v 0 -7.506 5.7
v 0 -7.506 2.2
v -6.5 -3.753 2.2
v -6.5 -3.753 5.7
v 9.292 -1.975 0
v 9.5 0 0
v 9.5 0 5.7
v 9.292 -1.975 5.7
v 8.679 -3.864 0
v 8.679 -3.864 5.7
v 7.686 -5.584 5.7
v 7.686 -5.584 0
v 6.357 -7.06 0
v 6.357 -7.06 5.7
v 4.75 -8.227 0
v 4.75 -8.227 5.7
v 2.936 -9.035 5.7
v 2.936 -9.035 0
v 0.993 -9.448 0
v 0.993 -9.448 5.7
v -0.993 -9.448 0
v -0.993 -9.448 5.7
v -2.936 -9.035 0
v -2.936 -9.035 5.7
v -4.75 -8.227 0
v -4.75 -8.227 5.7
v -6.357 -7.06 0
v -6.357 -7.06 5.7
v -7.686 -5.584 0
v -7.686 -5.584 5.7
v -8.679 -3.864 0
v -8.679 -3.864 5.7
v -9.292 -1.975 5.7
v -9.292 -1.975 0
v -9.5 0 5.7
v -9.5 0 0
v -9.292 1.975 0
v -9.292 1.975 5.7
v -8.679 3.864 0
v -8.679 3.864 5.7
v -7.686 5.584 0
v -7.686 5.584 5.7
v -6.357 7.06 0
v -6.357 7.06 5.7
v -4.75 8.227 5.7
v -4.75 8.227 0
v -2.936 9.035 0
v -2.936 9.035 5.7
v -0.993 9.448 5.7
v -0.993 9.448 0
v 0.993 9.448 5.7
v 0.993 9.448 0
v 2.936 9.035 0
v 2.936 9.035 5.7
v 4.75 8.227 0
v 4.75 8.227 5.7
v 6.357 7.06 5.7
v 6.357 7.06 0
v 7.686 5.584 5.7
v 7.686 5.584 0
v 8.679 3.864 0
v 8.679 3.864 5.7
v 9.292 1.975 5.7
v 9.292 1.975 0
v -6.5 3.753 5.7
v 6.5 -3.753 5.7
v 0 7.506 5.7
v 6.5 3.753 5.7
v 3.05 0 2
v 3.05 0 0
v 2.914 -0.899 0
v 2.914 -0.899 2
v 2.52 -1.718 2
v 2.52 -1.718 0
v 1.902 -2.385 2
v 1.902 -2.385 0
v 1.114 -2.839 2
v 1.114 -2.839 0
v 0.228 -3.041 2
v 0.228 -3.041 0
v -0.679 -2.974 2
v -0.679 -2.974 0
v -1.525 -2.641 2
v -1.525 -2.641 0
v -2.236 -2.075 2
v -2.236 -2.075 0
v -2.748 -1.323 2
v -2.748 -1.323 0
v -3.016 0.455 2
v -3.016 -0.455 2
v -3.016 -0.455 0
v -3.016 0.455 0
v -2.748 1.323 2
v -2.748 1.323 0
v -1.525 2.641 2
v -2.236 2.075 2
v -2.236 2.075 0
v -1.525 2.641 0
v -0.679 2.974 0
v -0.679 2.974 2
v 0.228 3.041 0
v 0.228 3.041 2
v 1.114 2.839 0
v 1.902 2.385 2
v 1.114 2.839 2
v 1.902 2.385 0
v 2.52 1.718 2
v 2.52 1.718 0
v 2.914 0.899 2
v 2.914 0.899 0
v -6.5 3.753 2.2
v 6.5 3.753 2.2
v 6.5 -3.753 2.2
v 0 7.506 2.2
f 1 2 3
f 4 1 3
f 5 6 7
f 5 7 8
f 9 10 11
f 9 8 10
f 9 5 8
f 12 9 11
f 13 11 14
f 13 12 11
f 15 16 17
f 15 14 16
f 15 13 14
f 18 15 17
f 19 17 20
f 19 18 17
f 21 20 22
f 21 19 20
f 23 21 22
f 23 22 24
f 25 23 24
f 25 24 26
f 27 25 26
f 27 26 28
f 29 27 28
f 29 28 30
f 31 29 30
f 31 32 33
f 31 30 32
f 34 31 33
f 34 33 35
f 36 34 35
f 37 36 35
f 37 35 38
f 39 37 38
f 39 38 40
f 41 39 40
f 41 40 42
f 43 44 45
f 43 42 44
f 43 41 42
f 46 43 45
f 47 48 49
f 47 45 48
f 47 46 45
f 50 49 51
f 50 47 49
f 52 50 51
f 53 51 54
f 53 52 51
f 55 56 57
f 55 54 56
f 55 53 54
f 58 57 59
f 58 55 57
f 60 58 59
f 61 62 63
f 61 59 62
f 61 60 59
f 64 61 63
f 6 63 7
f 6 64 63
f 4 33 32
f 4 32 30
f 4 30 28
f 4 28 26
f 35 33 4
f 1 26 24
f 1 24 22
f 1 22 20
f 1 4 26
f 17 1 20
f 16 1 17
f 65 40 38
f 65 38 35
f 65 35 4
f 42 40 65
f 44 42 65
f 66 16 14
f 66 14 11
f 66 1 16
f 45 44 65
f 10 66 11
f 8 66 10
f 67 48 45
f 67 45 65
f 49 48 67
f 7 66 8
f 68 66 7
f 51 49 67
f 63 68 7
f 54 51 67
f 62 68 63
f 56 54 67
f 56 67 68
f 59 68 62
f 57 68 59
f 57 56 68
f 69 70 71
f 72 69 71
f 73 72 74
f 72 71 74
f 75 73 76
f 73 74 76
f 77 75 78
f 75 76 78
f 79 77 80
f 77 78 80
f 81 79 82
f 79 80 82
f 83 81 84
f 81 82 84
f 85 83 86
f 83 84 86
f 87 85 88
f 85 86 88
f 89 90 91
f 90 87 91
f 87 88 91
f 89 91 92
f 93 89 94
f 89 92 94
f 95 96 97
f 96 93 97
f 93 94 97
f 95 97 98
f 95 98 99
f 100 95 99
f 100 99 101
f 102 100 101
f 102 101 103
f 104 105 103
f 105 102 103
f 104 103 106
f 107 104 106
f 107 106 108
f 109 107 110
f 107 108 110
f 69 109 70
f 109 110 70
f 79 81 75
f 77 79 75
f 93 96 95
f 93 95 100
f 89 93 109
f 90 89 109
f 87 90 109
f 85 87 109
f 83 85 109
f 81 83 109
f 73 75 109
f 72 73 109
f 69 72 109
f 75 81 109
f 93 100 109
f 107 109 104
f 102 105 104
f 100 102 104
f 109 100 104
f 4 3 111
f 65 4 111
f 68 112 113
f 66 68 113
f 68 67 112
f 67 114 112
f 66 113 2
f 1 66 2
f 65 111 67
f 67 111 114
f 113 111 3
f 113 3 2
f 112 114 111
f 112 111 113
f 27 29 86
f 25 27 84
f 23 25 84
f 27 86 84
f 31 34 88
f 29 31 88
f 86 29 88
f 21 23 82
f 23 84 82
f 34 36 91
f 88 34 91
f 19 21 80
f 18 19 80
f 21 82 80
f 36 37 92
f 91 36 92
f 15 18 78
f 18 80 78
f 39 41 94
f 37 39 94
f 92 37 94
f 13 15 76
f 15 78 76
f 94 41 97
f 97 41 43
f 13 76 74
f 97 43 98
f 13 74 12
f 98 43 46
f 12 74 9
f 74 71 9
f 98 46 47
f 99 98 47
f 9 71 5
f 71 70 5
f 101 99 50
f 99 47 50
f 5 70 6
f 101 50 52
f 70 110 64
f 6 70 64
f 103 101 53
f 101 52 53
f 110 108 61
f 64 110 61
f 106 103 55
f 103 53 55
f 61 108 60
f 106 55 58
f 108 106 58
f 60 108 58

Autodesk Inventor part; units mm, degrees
ref_plane "YZ Plane" through (0, 0, 0) normal (1, 0, 0) x (0, 1, 0)
ref_plane "XZ Plane" through (0, 0, 0) normal (0, 1, 0) x (-1, 0, 0)
ref_plane "XY Plane" through (0, 0, 0) normal (0, 0, 1) x (1, 0, 0)
sketch "Skizze1" plane through (0, 0, 0) normal (0, 0, 1) x (1, 0, 0)
  circle A0 centre (0, 0) radius 9.5
  circle A1 centre (0, 0) radius 3.05
  dimension "d0" = 6.1
  dimension "d1" = 19
extrude "Extrusion1" add sketch "Skizze1" along normal blind 2
sketch "Skizze2" plane through (0, 0, 2) normal (0, 0, 1) x (1, 0, 0)
  circle A0 centre (0, 0) radius 9.5 projected
extrude "Extrusion2" add sketch "Skizze2" along normal blind 0.2
sketch "Skizze3" plane through (0, 0, 2.2) normal (0, 0, 1) x (1, 0, 0)
  circle A0 centre (0, 0) radius 9.5 projected
  line L0 (0, 7.5056) -> (6.5, 3.7528)
  line L1 (6.5, 3.7528) -> (6.5, -3.7528)
  line L2 (6.5, -3.7528) -> (0, -7.5056)
  line L3 (0, -7.5056) -> (-6.5, -3.7528)
  line L4 (-6.5, -3.7528) -> (-6.5, 3.7528)
  line L5 (-6.5, 3.7528) -> (0, 7.5056)
  dimension "d6" = 13
extrude "Extrusion3" add sketch "Skizze3" along normal blind 3.5
properties part number "M8_encoderMagnet" material "ABS-Kunststoff - Schwarz"
